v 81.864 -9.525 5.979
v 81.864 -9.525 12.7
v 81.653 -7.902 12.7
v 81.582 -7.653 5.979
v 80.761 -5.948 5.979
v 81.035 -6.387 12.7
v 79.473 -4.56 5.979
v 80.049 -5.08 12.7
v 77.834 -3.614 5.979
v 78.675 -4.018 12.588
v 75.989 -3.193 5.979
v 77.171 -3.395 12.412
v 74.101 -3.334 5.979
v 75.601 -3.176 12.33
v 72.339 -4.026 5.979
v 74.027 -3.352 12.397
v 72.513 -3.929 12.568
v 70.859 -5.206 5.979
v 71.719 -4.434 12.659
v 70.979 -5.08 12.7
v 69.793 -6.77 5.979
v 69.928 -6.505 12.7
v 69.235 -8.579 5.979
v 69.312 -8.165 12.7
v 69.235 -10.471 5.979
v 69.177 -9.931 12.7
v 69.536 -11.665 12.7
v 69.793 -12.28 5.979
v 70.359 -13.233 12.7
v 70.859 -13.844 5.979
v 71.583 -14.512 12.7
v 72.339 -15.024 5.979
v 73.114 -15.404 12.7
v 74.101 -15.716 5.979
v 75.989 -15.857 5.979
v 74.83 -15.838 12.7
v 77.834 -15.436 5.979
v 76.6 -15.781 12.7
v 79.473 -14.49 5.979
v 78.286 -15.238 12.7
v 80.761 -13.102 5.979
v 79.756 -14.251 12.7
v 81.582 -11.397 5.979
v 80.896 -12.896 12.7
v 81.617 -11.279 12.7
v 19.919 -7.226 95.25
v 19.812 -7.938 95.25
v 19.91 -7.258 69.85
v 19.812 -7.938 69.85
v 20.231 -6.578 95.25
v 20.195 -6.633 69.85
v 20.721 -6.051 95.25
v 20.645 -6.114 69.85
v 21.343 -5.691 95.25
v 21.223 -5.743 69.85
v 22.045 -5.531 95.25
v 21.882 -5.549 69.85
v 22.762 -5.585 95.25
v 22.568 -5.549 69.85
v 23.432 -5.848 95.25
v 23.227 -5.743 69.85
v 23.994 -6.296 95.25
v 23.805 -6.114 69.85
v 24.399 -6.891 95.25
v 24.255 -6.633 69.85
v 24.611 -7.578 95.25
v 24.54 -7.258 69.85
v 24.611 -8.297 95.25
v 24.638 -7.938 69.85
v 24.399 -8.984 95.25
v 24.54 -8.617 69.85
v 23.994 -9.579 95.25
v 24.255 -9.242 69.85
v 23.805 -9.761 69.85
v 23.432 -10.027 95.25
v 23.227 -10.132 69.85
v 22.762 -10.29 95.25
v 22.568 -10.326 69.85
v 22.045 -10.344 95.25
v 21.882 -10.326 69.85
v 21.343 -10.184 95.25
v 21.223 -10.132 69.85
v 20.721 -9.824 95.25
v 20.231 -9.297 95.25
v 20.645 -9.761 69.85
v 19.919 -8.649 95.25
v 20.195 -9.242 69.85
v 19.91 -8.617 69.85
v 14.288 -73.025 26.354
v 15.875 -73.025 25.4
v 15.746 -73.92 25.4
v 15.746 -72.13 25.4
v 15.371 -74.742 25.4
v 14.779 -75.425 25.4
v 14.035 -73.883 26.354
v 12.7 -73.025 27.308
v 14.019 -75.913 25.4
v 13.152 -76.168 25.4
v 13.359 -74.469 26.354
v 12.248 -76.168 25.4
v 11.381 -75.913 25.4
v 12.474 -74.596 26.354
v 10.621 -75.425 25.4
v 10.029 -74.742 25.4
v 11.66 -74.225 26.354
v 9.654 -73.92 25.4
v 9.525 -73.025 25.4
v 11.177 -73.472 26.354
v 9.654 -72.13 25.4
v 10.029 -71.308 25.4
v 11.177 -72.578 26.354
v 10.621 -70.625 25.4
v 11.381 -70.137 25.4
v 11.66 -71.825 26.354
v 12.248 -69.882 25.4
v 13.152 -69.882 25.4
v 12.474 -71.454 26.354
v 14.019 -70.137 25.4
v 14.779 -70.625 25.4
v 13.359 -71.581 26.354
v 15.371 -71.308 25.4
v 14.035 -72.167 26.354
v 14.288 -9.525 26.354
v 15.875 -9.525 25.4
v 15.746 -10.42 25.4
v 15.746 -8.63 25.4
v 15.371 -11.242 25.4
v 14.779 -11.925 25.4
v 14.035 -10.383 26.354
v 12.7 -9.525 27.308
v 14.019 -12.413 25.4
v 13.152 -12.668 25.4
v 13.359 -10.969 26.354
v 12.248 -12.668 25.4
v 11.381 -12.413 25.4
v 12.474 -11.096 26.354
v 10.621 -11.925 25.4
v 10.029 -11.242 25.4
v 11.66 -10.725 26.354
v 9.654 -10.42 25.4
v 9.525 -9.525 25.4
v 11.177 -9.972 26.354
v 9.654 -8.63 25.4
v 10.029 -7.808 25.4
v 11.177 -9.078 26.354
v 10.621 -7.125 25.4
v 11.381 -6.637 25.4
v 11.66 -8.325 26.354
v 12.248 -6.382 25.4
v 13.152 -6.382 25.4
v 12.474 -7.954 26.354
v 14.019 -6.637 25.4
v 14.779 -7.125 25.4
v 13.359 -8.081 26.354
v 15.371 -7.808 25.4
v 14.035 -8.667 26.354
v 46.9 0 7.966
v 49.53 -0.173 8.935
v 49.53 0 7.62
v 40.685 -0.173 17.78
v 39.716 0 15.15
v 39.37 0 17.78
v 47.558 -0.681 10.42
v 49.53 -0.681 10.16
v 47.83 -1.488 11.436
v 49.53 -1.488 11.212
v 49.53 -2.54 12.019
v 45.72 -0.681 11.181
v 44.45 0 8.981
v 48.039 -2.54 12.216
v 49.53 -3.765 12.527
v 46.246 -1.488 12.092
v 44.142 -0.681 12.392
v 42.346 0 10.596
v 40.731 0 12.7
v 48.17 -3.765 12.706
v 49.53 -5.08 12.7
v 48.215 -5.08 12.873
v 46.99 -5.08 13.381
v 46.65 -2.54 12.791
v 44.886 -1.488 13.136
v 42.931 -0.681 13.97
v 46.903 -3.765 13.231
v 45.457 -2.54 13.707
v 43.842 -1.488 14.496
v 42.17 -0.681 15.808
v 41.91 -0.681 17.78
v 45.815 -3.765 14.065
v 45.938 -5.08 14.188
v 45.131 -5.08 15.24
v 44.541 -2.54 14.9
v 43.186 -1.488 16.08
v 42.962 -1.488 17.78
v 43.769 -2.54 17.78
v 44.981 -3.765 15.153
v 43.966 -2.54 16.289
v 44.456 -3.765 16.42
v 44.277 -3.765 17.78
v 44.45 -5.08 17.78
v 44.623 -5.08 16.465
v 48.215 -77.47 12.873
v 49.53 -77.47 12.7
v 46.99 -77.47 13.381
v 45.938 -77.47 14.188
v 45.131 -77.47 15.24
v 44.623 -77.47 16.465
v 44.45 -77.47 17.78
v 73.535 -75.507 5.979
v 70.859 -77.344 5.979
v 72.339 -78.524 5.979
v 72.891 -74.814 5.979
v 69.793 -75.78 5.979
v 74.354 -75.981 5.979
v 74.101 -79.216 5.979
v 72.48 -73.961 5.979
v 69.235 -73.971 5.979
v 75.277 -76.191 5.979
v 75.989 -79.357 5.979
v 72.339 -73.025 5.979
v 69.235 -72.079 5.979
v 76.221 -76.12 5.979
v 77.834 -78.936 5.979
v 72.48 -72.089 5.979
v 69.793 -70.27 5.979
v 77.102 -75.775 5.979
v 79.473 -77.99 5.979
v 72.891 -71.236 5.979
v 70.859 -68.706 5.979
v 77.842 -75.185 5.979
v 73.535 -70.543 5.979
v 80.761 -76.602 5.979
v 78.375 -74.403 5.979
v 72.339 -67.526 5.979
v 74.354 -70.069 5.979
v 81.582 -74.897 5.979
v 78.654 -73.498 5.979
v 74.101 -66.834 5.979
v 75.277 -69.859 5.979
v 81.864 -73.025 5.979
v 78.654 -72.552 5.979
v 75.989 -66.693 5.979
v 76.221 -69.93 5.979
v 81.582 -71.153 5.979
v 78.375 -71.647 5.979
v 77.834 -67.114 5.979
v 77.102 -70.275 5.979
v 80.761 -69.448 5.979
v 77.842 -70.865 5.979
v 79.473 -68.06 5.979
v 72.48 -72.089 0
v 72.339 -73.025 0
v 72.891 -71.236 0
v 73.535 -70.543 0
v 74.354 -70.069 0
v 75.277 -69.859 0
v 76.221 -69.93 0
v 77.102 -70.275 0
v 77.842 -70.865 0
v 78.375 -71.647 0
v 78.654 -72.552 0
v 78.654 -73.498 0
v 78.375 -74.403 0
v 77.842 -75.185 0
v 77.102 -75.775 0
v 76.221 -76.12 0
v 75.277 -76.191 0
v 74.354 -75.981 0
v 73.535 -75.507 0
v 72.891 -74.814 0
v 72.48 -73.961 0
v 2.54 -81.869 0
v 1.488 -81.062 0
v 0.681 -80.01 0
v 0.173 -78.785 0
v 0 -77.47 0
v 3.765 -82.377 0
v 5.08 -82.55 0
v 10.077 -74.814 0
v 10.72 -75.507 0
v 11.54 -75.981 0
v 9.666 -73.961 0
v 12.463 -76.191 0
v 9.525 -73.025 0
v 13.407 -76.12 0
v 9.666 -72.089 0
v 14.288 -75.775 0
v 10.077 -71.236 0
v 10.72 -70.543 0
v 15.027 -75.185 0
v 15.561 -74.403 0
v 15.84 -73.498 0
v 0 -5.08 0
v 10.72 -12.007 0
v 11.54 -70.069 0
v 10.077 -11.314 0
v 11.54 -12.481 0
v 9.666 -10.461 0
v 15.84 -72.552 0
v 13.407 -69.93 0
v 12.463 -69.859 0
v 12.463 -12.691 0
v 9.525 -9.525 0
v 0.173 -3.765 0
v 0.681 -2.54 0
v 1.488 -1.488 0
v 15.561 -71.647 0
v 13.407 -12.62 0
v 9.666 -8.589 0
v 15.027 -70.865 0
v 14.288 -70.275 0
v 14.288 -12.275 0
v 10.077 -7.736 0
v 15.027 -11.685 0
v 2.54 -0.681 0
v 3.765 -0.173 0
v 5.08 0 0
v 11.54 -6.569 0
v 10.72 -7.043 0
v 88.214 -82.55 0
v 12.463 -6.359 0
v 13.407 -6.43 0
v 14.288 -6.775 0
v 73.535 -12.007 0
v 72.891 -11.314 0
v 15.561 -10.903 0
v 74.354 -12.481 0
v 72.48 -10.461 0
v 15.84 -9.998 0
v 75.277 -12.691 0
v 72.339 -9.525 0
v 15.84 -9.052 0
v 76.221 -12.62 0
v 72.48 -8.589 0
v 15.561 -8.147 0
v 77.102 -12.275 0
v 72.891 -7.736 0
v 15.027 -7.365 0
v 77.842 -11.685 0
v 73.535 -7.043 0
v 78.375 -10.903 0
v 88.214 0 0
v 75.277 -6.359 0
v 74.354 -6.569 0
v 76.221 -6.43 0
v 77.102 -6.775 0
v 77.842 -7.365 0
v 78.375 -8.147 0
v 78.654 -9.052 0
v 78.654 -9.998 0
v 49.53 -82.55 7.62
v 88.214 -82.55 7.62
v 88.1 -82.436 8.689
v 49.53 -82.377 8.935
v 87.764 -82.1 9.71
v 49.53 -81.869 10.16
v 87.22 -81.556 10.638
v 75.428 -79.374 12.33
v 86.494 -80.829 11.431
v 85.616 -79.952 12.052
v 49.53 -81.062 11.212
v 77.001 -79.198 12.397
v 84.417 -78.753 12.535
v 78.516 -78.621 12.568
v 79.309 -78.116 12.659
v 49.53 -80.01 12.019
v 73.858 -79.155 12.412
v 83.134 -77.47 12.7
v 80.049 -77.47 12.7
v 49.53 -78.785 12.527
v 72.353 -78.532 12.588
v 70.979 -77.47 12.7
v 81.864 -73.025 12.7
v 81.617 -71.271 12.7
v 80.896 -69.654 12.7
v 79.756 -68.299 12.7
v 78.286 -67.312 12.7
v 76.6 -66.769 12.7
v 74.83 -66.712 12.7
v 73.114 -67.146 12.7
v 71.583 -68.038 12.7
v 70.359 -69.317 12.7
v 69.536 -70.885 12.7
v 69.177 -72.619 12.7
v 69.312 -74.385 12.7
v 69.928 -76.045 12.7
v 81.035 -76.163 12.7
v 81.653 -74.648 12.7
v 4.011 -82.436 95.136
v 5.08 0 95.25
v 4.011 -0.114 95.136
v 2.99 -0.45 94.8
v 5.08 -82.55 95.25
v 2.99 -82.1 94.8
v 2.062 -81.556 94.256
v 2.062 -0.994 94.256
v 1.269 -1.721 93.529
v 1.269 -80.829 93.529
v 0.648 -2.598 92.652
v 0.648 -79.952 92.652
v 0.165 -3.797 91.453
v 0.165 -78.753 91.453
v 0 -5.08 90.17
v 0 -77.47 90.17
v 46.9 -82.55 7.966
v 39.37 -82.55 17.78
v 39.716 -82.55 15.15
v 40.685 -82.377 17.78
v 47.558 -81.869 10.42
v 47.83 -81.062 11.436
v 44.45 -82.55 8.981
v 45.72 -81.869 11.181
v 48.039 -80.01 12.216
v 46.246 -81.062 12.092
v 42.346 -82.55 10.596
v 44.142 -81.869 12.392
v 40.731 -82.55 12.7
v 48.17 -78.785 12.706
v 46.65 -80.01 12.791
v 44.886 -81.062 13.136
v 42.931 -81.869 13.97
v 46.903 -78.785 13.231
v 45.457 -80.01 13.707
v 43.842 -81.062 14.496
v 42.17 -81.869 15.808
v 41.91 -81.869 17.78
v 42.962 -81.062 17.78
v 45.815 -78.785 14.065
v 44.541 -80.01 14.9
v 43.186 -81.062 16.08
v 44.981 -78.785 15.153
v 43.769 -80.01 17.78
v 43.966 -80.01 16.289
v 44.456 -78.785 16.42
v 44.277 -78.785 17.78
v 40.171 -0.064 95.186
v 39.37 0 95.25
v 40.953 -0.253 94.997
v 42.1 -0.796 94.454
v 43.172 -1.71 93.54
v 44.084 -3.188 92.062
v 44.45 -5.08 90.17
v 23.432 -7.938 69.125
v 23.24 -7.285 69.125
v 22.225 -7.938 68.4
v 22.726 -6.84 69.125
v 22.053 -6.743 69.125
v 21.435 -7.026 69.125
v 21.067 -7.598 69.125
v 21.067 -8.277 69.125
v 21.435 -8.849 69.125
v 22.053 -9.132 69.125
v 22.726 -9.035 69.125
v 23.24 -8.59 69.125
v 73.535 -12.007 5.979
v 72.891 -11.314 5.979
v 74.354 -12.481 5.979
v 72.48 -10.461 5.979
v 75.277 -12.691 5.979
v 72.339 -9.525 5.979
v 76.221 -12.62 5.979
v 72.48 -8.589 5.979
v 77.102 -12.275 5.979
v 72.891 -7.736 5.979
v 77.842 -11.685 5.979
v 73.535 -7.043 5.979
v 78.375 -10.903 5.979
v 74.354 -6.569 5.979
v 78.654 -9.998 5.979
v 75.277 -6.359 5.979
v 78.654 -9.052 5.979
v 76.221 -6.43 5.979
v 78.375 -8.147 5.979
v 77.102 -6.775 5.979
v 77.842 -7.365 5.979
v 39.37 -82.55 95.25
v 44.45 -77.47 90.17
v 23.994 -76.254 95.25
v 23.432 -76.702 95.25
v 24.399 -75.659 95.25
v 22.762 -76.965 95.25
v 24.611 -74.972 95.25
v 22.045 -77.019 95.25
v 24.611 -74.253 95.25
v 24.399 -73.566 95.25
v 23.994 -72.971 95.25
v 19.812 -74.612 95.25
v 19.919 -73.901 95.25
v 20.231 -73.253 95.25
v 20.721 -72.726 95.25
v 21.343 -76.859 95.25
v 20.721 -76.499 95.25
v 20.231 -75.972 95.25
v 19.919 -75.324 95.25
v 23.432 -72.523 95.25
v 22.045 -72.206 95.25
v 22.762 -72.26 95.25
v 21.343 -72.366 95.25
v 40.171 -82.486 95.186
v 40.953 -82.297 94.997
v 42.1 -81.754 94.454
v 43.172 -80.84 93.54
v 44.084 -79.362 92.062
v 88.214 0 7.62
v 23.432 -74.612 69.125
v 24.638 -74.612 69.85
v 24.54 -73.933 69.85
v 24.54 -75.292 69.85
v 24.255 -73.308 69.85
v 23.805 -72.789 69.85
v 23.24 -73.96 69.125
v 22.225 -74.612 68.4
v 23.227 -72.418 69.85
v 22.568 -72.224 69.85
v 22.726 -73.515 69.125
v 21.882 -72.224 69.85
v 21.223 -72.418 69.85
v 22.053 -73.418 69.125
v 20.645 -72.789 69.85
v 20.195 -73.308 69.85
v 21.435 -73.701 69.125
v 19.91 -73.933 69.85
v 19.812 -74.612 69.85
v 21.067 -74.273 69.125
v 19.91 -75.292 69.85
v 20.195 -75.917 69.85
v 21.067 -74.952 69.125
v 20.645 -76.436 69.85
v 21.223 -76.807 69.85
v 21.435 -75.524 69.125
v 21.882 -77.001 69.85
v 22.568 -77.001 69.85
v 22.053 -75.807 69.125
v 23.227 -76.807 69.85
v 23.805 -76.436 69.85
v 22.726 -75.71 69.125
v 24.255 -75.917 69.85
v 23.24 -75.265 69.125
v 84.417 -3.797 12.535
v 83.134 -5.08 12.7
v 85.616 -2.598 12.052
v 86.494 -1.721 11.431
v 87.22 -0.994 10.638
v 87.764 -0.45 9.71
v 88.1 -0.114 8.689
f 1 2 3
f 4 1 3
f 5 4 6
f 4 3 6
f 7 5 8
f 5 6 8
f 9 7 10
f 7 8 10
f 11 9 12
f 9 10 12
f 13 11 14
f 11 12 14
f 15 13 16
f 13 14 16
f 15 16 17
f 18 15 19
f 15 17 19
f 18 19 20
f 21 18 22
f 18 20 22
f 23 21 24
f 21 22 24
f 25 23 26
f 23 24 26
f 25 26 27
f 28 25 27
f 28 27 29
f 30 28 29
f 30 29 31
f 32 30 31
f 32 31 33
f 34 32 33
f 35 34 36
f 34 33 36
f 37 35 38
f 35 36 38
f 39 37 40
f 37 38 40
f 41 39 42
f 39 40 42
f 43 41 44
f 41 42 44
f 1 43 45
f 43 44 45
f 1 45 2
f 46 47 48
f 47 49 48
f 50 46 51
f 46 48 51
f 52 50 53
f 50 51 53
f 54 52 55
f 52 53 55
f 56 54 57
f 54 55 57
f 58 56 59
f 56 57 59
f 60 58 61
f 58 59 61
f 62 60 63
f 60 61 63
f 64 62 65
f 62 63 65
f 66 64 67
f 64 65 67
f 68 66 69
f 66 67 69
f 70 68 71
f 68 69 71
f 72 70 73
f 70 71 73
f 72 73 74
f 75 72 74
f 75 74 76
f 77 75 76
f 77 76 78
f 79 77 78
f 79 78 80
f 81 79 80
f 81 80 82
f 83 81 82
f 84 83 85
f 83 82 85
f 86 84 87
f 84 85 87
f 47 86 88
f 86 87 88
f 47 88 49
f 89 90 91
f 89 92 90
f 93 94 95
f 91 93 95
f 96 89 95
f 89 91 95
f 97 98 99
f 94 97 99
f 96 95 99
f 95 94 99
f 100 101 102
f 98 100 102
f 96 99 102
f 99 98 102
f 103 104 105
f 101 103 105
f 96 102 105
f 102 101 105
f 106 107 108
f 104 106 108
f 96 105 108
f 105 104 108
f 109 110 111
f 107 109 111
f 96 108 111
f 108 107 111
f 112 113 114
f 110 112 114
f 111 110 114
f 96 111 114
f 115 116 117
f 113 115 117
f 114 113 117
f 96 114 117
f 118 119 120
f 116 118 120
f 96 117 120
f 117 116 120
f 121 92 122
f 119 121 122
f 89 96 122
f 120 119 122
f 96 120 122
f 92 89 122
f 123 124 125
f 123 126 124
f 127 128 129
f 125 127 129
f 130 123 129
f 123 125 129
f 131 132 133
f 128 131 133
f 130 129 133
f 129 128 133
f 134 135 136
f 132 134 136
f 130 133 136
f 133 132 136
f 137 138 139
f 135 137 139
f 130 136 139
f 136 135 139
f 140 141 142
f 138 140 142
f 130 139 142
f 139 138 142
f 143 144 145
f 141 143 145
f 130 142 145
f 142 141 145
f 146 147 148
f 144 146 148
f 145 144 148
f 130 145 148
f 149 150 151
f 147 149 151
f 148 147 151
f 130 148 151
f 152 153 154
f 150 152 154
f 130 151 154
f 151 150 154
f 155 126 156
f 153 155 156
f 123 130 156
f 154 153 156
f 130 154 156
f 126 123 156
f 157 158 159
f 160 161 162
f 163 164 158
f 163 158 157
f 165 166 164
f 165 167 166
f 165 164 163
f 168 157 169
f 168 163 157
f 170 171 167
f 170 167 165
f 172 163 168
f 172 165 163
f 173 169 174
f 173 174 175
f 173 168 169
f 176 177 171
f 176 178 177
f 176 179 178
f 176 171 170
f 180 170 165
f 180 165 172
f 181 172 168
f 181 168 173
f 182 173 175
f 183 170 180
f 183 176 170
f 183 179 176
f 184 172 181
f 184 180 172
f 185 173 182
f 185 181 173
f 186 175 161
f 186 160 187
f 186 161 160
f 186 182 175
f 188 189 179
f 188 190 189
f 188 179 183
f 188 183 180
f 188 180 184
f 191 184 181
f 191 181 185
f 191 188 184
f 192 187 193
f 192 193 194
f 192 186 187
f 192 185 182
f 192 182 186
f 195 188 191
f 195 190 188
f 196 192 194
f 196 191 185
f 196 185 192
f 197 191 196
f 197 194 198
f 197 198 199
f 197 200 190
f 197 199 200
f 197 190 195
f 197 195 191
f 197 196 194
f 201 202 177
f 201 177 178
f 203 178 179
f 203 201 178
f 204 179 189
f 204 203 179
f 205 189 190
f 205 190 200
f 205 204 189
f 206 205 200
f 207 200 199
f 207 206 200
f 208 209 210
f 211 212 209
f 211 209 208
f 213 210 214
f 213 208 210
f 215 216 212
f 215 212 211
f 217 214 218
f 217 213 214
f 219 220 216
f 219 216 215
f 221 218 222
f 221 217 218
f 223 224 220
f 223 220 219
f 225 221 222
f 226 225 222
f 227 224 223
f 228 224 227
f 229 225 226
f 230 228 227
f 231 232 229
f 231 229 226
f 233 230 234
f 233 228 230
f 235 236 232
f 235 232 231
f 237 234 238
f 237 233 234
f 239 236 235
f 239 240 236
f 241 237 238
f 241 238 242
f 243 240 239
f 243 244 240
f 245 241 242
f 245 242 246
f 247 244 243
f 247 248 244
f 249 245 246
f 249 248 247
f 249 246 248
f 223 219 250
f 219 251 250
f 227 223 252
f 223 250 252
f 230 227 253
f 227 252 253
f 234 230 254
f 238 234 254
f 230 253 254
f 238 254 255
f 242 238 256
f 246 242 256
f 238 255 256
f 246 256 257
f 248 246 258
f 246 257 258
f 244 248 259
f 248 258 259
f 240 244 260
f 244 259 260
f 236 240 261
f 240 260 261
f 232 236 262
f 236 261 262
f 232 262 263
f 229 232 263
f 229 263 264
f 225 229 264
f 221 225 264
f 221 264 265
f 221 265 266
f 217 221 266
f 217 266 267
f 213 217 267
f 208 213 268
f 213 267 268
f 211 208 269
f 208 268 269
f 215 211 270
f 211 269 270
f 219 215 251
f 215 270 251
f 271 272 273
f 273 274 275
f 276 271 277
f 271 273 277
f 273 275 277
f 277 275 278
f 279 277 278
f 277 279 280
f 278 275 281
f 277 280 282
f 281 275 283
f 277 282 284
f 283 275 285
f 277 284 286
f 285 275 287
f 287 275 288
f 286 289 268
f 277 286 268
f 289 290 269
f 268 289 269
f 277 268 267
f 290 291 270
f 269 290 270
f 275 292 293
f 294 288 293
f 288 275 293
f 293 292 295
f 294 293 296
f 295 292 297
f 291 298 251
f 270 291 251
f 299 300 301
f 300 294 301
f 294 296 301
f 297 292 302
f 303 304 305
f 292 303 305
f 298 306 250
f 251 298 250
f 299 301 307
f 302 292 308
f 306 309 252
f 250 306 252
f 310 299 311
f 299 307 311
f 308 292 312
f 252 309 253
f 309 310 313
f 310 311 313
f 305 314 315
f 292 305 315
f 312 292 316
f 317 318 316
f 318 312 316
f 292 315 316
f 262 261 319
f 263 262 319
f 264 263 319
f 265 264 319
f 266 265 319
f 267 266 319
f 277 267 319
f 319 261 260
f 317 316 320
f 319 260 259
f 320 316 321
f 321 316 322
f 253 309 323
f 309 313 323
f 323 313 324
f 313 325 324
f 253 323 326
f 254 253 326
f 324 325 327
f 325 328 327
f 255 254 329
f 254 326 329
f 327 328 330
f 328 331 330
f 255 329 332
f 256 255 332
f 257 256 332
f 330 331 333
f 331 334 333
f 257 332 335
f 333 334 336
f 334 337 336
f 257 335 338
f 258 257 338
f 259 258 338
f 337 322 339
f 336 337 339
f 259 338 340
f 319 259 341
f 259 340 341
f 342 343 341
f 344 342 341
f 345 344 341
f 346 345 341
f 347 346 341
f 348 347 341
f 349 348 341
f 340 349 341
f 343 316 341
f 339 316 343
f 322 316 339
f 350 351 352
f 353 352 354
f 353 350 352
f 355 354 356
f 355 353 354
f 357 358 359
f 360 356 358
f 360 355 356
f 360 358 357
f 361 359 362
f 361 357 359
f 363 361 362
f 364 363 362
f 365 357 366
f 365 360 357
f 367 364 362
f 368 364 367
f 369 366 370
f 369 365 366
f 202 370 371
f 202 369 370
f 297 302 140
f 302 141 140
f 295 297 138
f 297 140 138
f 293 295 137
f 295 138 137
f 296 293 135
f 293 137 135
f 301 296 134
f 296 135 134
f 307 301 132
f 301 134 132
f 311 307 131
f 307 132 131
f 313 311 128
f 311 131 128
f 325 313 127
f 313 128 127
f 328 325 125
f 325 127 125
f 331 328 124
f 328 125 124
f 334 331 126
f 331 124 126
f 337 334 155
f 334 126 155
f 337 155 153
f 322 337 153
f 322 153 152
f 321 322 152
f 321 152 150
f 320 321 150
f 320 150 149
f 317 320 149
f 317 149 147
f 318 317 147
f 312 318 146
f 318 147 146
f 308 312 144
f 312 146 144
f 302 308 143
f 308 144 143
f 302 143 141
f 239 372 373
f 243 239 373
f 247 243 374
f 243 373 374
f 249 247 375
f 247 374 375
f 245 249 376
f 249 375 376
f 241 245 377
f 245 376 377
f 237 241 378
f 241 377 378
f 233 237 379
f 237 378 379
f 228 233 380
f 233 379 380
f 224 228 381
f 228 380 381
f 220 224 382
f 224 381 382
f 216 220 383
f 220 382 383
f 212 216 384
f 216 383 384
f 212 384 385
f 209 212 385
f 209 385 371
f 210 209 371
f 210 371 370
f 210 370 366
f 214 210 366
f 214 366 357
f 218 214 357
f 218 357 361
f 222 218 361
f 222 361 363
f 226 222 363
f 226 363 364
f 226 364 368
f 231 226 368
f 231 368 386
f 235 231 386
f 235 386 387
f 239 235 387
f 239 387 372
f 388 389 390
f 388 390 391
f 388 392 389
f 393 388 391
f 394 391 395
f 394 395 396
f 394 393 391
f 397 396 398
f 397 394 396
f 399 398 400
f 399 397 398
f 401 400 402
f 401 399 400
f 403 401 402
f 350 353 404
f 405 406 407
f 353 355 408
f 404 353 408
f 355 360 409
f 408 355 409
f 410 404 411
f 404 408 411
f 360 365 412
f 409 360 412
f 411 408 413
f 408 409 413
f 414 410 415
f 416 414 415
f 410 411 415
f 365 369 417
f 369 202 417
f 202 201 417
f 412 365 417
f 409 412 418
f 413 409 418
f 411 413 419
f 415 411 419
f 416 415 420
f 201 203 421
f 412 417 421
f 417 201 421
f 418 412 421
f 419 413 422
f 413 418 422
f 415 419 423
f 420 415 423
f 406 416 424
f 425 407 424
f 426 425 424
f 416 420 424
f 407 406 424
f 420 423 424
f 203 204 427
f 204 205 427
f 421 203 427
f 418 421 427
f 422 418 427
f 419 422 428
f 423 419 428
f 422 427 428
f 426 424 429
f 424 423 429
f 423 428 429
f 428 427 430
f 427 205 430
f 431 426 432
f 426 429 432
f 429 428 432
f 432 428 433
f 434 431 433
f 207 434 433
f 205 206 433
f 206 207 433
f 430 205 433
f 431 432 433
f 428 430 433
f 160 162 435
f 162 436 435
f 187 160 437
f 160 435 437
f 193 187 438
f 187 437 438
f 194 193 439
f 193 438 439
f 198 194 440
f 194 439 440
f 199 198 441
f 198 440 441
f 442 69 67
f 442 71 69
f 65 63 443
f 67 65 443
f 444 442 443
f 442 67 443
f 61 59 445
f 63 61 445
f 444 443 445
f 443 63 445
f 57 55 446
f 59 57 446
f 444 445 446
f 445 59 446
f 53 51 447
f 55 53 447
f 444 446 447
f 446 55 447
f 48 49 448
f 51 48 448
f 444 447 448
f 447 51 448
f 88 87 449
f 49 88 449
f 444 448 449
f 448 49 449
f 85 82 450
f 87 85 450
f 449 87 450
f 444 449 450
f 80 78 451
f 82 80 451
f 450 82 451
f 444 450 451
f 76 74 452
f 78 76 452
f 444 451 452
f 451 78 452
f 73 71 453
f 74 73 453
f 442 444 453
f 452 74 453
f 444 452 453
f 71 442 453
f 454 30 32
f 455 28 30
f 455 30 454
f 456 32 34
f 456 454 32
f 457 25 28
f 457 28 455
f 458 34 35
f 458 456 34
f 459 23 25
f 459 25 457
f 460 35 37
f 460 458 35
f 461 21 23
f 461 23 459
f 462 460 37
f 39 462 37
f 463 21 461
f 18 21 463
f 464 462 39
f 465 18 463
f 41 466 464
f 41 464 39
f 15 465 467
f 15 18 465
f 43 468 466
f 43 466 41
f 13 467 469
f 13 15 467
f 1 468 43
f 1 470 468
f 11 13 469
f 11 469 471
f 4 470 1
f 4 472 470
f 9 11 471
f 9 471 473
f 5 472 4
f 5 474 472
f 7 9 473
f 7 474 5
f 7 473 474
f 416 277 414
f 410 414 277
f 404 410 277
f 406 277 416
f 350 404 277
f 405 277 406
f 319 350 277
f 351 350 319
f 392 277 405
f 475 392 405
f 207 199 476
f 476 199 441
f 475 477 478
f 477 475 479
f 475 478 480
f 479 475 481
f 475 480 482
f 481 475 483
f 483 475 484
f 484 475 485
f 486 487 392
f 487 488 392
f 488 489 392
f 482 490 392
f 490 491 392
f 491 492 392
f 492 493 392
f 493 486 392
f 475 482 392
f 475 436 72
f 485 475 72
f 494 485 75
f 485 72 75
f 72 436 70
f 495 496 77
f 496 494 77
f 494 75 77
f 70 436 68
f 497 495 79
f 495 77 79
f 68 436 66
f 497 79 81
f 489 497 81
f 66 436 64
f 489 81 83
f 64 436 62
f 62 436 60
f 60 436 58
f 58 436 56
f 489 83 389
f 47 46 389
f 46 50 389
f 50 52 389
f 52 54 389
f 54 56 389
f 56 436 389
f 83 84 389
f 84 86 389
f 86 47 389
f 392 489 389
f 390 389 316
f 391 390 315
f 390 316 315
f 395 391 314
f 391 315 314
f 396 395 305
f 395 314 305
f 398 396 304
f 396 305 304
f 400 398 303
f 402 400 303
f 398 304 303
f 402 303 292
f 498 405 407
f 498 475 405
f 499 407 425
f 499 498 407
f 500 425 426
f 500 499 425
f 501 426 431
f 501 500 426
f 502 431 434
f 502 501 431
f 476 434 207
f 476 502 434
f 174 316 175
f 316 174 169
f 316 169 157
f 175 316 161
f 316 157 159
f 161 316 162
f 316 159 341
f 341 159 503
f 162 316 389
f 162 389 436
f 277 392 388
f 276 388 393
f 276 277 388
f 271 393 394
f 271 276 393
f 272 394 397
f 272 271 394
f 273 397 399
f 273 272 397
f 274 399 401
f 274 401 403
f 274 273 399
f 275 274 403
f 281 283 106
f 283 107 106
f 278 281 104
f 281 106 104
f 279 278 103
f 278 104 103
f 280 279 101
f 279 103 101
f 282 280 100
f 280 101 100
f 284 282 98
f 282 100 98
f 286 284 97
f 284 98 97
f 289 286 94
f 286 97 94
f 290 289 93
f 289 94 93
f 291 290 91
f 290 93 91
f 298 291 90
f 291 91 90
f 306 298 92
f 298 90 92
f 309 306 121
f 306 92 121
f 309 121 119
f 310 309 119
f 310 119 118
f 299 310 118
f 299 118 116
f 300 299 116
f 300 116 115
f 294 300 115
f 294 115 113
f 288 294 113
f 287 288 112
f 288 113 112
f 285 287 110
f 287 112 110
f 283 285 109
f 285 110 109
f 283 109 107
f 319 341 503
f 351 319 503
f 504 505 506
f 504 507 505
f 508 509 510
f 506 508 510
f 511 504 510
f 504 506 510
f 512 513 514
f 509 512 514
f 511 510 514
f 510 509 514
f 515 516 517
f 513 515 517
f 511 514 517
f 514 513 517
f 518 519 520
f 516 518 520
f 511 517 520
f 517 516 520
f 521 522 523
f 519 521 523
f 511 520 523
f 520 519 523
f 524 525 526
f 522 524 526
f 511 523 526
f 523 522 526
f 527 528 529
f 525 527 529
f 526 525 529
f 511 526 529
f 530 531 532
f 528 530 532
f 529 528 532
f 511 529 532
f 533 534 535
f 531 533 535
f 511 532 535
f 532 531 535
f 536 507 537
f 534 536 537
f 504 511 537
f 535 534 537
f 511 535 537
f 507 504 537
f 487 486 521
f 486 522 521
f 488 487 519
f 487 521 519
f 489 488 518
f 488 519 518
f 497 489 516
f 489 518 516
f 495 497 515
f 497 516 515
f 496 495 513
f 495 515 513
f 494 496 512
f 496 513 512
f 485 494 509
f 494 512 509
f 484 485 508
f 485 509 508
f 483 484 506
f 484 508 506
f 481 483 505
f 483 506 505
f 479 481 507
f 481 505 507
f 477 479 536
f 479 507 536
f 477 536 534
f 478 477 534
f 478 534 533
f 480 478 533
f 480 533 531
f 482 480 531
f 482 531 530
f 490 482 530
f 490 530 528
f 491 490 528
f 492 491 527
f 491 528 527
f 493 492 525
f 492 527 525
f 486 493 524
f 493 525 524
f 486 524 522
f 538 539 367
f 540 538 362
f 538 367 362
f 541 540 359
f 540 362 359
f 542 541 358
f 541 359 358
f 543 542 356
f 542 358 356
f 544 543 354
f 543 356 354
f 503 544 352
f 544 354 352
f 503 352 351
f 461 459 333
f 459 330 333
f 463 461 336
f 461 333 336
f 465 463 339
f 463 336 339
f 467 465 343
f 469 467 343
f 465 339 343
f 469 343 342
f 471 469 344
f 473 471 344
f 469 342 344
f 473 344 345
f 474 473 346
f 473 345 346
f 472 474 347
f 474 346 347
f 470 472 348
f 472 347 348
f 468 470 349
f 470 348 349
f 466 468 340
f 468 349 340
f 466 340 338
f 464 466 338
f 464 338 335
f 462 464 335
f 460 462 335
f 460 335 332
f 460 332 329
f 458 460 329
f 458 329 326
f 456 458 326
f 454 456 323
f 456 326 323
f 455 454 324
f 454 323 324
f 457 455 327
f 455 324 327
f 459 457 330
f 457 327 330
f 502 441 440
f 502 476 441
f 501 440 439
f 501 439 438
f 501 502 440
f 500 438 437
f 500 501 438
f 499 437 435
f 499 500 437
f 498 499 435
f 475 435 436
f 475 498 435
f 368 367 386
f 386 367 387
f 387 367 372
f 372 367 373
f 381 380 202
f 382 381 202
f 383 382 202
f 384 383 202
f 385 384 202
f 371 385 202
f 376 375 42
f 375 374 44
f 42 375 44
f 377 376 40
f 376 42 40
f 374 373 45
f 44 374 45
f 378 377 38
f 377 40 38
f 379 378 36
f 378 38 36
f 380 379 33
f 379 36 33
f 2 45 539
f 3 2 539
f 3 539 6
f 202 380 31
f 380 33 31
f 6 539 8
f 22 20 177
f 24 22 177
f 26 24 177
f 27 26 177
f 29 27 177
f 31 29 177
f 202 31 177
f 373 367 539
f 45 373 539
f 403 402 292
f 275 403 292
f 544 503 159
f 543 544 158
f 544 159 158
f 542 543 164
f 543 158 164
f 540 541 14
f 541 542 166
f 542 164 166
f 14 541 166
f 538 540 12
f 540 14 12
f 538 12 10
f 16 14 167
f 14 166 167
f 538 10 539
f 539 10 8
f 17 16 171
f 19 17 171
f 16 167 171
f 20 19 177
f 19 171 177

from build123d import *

# Parameters (mm, degrees)
F1_DEPTH       = 82.55
F2_F1_R        = 5.08
F2_F2_R        = 5.08
F4_D           = 4.826
F4_DEPTH       = 25.4
F4_TIP         = 1.4498766737
F6_D           = 6.35
F6_DEPTH       = 25.4
F6_TIP         = 1.9077324654
F8_D           = 6.35
F8_DEPTH       = 25.4
F8_START       = 0.3707141
F8_CBORE_D     = 12.7
F8_CBORE_DEPTH = 6.35
F8_TIP         = 1.9077324654


with BuildPart() as f1:
    # F0 (on Front) → F1 (new body)
    with BuildSketch(Plane.XZ):
        Polygon((0, 95.25), (0, 0), (88.2142, 0), (88.2142, 12.7), (44.45, 12.7), (44.45, 95.25), align=None)
    extrude(amount=F1_DEPTH)

    # F2: fillet of radius 5.08 on 8 edges, made by hand

    # F2_f1
    f2_f1_edges = [f1.edges().sort_by_distance(p)[0] for p in [
        (44.45, -41.275, 12.7),
    ]]
    fillet(f2_f1_edges, radius=F2_F1_R)

    # F2_f2
    f2_f2_edges = [f1.edges().sort_by_distance(p)[0] for p in [
        (44.45, -41.275, 95.25),
        (0, -41.275, 95.25),
        (44.45, -82.55, 56.515),
        (44.45, 0, 56.515),
        (0, -82.55, 47.625),
        (0, 0, 47.625),
        (88.2142, -41.275, 12.7),
        (45.9378975516, 0, 14.1878975516),
        (45.9378975516, -82.55, 14.1878975516),
    ]]
    fillet(f2_f2_edges, radius=F2_F2_R)

    # F4
    with Locations(Plane.XY.offset(95.25)):
        with Locations((22.225, -7.9375), (22.225, -74.6125)):
            Hole(F4_D / 2, depth=F4_DEPTH)
            with Locations((0, 0, -(F4_DEPTH + F4_TIP / 2))):  # 118° drill point
                Cone(0, F4_D / 2, F4_TIP, mode=Mode.SUBTRACT)

    # F6
    with Locations(Plane(origin=(0, 0, 0), x_dir=(1, 0, 0), z_dir=(0, 0, -1))):
        with Locations((12.7, 73.025), (12.7, 9.525)):
            Hole(F6_D / 2, depth=F6_DEPTH)
            with Locations((0, 0, -(F6_DEPTH + F6_TIP / 2))):  # 118° drill point
                Cone(0, F6_D / 2, F6_TIP, mode=Mode.SUBTRACT)

    # F8
    # its depths count from where the whole tool has entered the part; down to there all is cleared
    with Locations(Plane.XY.offset(12.7).offset(-F8_START)):
        with Locations((75.5142, -9.525), (75.5142, -73.025)):
            CounterBoreHole(F8_D / 2, F8_CBORE_D / 2, F8_CBORE_DEPTH, depth=F8_DEPTH)
            with Locations((0, 0, -(F8_DEPTH + F8_TIP / 2))):  # 118° drill point
                Cone(0, F8_D / 2, F8_TIP, mode=Mode.SUBTRACT)


solid = f1.part
